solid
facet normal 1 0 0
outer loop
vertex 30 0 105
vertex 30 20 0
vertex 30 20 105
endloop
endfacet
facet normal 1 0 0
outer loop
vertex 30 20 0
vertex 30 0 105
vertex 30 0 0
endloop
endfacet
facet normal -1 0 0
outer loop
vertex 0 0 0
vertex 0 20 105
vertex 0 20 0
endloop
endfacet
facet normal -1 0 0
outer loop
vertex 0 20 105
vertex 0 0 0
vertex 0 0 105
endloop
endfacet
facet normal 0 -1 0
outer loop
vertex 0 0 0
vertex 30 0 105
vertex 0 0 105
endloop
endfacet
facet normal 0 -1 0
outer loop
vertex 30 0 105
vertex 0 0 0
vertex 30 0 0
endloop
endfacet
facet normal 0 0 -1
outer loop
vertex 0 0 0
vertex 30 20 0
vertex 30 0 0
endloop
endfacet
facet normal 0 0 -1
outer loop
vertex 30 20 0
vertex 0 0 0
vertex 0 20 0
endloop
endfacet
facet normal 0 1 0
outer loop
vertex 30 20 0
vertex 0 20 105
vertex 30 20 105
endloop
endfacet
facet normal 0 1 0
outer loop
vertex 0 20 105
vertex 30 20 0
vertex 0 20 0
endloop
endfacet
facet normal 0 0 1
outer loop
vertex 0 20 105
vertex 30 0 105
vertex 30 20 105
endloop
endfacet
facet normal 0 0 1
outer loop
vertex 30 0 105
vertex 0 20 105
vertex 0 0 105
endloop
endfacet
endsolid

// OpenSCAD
harmonicaHeight = 30;
harmonicaLength = 105;
HarmonicaThickness = 20;

module harmonicaBody() {
    cube([harmonicaLength, HarmonicaThickness, harmonicaHeight]);
}

rotate([0,90,0])
  translate([-harmonicaLength,0,0])
  harmonicaBody();
